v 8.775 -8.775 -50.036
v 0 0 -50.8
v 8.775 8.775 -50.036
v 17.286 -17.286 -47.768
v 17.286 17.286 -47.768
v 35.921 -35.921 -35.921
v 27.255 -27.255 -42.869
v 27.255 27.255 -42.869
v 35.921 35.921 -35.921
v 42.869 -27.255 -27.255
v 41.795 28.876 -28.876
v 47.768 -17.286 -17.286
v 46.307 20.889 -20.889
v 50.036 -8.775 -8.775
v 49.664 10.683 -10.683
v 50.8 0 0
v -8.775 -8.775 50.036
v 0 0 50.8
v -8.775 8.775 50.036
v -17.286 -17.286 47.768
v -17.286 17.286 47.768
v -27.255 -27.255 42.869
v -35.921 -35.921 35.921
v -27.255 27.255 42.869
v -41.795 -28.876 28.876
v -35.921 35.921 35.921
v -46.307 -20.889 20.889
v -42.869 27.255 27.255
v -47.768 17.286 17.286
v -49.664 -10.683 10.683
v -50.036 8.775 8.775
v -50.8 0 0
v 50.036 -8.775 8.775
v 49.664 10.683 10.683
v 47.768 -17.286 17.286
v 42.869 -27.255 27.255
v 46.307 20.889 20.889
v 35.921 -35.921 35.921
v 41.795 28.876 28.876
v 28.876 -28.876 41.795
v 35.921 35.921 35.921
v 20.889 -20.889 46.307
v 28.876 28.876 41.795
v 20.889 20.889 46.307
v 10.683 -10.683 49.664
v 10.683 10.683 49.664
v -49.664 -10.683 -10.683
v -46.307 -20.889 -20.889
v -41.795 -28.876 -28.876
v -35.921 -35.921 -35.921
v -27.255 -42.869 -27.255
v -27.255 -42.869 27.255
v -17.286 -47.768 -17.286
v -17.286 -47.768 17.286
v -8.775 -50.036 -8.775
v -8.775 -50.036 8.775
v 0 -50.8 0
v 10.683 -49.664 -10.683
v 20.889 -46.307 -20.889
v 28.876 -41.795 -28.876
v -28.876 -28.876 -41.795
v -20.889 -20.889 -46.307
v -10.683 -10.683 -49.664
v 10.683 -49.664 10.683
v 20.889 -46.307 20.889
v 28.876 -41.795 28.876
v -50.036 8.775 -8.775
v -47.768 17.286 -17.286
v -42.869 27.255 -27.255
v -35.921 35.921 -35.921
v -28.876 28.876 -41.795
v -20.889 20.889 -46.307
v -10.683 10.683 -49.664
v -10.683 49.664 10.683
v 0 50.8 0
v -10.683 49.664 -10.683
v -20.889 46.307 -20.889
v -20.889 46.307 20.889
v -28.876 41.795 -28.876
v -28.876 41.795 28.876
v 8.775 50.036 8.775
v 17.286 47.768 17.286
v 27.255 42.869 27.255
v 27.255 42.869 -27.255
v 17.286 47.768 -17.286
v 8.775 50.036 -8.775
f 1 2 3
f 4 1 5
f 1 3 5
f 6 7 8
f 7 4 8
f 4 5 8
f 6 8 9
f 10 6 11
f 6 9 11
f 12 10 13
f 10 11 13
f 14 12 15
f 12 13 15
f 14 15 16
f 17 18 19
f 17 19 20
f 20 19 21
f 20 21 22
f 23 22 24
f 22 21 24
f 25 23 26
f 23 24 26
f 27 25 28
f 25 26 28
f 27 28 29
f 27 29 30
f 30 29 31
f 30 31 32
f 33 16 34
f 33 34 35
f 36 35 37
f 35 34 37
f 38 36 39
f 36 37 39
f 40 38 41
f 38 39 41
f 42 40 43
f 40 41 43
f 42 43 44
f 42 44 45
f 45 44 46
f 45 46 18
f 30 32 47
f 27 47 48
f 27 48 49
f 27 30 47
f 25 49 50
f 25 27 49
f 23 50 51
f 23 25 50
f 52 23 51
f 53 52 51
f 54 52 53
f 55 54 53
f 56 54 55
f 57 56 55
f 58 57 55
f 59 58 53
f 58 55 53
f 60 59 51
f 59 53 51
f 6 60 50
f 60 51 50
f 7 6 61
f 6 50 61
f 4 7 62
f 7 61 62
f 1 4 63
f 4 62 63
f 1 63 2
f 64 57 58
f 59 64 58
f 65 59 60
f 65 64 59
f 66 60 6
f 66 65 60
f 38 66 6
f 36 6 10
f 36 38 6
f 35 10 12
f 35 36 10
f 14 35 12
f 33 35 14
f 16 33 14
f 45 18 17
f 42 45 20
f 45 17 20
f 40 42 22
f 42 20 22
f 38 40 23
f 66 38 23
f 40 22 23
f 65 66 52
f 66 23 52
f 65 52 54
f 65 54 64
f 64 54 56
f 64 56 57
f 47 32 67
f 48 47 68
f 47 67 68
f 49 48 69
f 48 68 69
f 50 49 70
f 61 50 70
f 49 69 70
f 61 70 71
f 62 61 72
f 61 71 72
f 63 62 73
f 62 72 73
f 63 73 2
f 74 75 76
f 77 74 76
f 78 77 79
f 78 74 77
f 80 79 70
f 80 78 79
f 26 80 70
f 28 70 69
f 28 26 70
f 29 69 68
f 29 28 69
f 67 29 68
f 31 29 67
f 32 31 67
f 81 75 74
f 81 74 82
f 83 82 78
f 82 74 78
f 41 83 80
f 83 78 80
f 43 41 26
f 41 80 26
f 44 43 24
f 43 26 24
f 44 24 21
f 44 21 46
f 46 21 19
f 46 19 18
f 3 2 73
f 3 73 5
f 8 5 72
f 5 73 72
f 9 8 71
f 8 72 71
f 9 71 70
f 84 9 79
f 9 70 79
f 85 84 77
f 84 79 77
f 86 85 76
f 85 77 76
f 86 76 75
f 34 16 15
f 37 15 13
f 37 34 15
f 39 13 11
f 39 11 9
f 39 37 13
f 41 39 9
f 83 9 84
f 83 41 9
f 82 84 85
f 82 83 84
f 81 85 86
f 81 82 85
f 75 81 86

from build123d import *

# Parameters (mm, degrees)
F0_R          = 50.8
F1_DEPTH      = 50.8
F1_DEPTH_BACK = 50.8
F4_START      = -50.8
F2_R          = 50.8
F4_DEPTH      = 101.6
F5_START      = -50.8
F3_R          = 50.8
F5_DEPTH      = 101.6


with BuildPart() as f1:
    # F0 (on Top) → F1 (new body, two sides)
    with BuildSketch(Plane.XY) as f1_sk:
        Circle(F0_R)
    extrude(amount=F1_DEPTH)
    extrude(f1_sk.sketch, amount=-F1_DEPTH_BACK)

    # F2 (on Front) → F4 (intersect)
    with BuildSketch(Plane.XZ.offset(F4_START)):
        Circle(F2_R)
    extrude(amount=F4_DEPTH, mode=Mode.INTERSECT)

    # F3 (on Right) → F5 (intersect)
    with BuildSketch(Plane.YZ.offset(F5_START)):
        Circle(F3_R)
    extrude(amount=F5_DEPTH, mode=Mode.INTERSECT)


solid = f1.part
